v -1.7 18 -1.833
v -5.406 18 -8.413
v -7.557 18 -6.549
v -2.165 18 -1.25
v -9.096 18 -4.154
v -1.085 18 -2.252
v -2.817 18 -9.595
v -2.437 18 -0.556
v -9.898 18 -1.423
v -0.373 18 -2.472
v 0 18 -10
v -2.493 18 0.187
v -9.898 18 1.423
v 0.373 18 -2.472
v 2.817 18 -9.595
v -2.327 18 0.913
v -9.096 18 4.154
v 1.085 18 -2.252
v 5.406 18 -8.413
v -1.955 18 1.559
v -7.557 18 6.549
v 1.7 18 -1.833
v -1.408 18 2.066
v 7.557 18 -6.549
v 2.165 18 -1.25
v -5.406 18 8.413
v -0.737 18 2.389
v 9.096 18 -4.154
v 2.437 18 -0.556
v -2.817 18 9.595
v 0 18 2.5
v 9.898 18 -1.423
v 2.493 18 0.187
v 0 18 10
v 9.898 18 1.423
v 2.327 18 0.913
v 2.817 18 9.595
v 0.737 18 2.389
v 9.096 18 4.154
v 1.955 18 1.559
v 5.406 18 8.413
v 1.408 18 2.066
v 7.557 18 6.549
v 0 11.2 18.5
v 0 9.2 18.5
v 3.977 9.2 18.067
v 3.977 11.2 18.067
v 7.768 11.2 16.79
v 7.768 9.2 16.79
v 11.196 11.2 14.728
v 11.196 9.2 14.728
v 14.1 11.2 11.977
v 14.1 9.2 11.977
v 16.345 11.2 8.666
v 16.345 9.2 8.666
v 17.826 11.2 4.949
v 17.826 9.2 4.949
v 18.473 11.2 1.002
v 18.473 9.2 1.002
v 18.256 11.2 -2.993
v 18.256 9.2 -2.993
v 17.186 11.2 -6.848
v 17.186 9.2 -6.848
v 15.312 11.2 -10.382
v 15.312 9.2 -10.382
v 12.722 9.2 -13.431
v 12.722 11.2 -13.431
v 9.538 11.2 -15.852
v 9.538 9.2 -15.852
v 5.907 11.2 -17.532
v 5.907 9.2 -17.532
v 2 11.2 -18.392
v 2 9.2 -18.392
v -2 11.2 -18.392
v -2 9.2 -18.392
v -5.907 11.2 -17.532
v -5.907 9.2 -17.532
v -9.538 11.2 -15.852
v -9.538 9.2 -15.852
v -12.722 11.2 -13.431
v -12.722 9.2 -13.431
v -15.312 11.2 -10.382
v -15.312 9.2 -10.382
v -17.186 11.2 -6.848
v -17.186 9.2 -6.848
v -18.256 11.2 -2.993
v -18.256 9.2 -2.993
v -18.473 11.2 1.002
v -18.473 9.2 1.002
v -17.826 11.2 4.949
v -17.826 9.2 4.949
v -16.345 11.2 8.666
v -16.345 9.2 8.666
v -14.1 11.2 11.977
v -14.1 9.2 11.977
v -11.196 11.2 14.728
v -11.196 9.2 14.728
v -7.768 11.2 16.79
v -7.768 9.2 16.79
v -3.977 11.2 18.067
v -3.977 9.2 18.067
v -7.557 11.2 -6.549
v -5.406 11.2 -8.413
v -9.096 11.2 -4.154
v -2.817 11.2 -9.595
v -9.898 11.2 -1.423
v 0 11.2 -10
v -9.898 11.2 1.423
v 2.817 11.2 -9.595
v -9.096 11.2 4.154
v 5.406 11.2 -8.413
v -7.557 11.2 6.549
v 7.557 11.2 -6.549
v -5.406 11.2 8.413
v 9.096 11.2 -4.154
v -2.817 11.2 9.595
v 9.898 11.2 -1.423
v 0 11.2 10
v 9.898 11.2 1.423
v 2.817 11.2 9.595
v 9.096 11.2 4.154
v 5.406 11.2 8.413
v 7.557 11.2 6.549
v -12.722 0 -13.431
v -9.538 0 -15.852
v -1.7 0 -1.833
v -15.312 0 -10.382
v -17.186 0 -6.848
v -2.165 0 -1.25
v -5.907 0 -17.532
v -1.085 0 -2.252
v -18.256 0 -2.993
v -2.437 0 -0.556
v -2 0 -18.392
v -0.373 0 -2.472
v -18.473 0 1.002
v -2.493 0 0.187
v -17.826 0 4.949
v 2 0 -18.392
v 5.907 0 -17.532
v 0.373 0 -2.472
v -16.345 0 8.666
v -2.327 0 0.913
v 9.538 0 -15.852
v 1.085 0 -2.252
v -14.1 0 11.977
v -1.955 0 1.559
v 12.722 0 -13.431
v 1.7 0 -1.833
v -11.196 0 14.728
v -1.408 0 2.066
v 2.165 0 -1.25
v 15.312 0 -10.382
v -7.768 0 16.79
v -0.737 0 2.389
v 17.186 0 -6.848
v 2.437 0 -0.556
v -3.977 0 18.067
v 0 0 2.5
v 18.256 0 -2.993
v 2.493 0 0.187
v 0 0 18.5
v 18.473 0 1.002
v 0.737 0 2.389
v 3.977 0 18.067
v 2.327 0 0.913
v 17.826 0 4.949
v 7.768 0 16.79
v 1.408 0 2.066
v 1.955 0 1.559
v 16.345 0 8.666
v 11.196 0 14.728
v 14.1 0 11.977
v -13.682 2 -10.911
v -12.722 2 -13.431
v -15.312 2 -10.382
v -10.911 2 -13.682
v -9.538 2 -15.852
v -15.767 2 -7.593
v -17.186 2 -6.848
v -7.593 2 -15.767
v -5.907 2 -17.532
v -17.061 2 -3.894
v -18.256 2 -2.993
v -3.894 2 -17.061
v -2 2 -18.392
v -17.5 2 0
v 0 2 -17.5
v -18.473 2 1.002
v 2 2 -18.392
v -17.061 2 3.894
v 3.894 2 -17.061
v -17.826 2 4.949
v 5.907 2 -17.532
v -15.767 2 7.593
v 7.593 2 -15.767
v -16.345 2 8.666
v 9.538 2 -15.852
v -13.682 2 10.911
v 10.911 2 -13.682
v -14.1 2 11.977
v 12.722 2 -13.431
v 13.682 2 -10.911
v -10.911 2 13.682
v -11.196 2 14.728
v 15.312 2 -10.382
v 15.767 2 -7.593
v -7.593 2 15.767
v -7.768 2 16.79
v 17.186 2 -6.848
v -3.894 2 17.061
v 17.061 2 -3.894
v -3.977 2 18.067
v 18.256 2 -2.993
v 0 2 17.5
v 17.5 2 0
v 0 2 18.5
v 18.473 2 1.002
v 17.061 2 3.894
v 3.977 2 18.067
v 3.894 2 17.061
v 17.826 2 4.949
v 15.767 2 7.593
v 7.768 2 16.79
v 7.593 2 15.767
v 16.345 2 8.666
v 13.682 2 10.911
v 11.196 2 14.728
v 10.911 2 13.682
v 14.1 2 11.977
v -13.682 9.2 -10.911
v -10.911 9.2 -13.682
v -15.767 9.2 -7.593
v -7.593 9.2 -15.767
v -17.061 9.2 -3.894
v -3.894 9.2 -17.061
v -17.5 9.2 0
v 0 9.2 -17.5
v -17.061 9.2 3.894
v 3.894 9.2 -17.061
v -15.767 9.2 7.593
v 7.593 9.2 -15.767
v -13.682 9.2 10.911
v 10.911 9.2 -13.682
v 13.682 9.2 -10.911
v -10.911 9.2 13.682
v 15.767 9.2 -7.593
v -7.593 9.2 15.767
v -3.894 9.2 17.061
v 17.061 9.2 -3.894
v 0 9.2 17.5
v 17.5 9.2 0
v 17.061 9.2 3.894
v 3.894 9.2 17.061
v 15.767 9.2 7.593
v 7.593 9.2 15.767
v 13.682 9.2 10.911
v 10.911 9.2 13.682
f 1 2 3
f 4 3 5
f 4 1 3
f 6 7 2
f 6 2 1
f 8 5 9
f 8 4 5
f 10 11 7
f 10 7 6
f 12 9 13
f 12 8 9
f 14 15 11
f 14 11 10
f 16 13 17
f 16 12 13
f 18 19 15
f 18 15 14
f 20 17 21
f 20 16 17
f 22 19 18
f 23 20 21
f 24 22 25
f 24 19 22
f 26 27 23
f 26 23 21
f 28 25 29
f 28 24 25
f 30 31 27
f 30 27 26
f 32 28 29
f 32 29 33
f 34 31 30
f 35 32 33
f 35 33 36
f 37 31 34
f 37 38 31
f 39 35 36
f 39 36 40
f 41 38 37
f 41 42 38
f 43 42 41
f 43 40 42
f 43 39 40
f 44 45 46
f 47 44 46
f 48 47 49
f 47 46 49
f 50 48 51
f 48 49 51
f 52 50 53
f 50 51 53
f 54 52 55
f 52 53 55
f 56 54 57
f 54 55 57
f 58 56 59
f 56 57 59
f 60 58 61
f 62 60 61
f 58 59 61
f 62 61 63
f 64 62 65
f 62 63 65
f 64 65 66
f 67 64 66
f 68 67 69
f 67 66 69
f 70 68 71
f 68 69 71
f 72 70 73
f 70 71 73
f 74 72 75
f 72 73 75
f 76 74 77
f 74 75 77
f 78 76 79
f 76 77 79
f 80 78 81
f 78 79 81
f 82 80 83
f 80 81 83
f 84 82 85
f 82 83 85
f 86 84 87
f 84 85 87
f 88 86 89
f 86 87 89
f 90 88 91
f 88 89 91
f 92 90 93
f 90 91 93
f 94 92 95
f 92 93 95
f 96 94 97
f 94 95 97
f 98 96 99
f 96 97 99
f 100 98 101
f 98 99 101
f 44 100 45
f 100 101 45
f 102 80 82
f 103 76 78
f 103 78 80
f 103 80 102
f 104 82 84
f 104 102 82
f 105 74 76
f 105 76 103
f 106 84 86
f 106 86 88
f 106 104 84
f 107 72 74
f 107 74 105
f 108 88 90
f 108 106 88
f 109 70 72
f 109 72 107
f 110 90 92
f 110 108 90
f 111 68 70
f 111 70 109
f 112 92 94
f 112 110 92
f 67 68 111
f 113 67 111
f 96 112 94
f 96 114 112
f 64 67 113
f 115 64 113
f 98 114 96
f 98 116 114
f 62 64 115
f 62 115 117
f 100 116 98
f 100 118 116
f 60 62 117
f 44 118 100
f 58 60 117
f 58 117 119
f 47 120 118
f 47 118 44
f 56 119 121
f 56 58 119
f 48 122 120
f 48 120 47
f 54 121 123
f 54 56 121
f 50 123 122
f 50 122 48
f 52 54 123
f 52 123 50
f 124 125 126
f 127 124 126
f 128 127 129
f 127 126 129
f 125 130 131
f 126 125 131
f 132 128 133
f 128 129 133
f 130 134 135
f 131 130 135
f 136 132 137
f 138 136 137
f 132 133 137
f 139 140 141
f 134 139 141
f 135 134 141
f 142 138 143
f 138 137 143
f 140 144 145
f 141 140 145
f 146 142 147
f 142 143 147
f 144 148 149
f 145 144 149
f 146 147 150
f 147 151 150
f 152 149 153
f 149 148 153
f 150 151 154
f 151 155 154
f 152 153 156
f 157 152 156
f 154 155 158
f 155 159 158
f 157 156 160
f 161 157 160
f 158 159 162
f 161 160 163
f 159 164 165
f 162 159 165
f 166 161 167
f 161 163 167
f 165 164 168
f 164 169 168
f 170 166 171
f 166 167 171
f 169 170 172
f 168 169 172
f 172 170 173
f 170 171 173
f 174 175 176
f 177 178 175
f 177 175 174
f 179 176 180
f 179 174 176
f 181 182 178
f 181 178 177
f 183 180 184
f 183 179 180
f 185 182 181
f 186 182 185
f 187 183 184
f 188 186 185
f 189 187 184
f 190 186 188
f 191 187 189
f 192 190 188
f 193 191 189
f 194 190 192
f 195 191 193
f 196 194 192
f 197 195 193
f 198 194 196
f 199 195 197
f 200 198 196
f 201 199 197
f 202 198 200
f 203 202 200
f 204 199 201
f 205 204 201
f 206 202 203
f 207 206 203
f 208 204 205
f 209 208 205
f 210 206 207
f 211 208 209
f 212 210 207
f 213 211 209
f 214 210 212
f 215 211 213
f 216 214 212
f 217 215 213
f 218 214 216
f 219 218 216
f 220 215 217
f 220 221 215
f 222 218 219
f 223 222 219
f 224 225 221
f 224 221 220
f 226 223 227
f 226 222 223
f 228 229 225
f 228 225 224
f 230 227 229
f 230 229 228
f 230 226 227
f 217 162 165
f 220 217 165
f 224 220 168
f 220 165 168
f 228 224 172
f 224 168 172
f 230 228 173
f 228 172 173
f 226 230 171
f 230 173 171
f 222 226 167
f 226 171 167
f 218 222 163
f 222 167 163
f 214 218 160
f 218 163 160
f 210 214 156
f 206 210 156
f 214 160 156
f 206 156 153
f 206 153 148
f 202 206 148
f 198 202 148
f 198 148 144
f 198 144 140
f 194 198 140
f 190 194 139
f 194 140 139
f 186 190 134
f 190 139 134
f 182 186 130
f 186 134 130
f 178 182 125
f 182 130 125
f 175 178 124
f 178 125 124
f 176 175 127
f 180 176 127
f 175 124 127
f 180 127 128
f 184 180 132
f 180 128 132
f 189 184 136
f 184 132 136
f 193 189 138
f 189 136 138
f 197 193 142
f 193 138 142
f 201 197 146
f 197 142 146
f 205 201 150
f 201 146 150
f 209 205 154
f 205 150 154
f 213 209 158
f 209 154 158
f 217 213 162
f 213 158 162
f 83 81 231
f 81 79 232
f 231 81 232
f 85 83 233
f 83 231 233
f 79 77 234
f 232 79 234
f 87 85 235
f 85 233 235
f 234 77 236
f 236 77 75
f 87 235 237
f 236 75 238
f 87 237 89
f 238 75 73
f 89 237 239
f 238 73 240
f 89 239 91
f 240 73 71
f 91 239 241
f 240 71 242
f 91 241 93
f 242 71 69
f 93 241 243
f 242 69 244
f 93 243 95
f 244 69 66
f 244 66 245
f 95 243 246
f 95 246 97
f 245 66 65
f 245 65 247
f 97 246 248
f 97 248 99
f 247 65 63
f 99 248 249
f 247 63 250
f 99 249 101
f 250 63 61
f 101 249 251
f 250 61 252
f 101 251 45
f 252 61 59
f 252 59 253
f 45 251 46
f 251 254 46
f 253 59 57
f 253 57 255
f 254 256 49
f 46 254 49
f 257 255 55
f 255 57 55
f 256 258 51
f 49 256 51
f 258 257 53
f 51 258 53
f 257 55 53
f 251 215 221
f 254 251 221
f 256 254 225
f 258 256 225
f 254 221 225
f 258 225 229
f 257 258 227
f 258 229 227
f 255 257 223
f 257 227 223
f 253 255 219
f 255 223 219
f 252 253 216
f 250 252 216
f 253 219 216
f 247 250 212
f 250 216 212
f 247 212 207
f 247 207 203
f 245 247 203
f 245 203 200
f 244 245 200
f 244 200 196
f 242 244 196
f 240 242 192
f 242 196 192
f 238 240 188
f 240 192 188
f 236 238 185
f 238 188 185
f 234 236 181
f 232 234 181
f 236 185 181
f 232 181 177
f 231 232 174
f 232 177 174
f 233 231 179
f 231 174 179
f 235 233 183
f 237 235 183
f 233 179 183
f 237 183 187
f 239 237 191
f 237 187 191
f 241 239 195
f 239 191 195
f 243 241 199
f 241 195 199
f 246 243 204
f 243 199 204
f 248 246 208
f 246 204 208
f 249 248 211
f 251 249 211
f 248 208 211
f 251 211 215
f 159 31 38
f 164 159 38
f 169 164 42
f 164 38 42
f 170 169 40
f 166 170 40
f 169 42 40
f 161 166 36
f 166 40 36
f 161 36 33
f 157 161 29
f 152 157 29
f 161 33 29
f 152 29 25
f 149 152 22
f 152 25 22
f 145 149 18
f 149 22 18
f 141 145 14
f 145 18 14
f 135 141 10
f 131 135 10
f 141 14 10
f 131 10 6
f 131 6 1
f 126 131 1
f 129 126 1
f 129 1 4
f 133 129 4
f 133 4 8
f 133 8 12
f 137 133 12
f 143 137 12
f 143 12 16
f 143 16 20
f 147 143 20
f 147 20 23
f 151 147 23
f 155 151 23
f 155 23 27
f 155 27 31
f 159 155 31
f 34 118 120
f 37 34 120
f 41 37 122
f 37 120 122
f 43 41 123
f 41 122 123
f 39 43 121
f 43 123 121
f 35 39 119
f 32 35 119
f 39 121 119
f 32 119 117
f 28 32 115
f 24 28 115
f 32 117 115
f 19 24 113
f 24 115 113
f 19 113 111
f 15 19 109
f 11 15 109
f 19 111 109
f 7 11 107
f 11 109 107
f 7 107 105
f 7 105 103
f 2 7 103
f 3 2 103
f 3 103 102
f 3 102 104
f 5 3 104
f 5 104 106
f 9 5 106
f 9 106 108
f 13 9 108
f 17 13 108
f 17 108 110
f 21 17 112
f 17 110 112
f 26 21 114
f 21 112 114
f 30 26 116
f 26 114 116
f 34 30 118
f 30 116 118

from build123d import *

# Parameters (mm, degrees)
SKIZZE1_R                       = 18.5
AUFSATZ_LINEAR_AUSTRAGEN1_DEPTH = 2
SKIZZE2_R                       = 17.5
AUFSATZ_LINEAR_AUSTRAGEN2_DEPTH = 7.2
SKIZZE3_R                       = 18.5
AUFSATZ_LINEAR_AUSTRAGEN3_DEPTH = 2
SKIZZE4_R                       = 10
AUFSATZ_LINEAR_AUSTRAGEN4_DEPTH = 6.8
SKIZZE5_R                       = 2.5
SCHNITT_LINEAR_AUSTRAGEN1_DEPTH = 32.756889016


with BuildPart() as part:
    # Skizze1 → Aufsatz-Linear austragen1 (new body)
    with BuildSketch(Plane(origin=(0, 0, 0), x_dir=(1, 0, 0), z_dir=(0, 1, 0))):
        with Locations(Location((0, 0, 0), (0, 0, 270))):
            Circle(SKIZZE1_R)
    extrude(amount=AUFSATZ_LINEAR_AUSTRAGEN1_DEPTH)

    # Skizze2 → Aufsatz-Linear austragen2 (add)
    with BuildSketch(Plane(origin=(0, 2, 0), x_dir=(1, 0, 0), z_dir=(0, 1, 0))):
        with Locations(Location((0, 0, 0), (0, 0, 270))):
            Circle(SKIZZE2_R)
    extrude(amount=AUFSATZ_LINEAR_AUSTRAGEN2_DEPTH)

    # Skizze3 → Aufsatz-Linear austragen3 (add)
    with BuildSketch(Plane(origin=(0, 9.2, 0), x_dir=(1, 0, 0), z_dir=(0, 1, 0))):
        with Locations(Location((0, 0, 0), (0, 0, 270))):
            Circle(SKIZZE3_R)
    extrude(amount=AUFSATZ_LINEAR_AUSTRAGEN3_DEPTH)

    # Skizze4 → Aufsatz-Linear austragen4 (add)
    with BuildSketch(Plane(origin=(0, 11.2, 0), x_dir=(1, 0, 0), z_dir=(0, 1, 0))):
        with Locations(Location((0, 0, 0), (0, 0, 270))):
            Circle(SKIZZE4_R)
    extrude(amount=AUFSATZ_LINEAR_AUSTRAGEN4_DEPTH)

    # Skizze5 → Schnitt-Linear austragen1 (cut, through all)
    with BuildSketch(Plane(origin=(0, 18, 0), x_dir=(1, 0, 0), z_dir=(0, 1, 0))):
        with Locations(Location((0, 0, 0), (0, 0, 270))):
            Circle(SKIZZE5_R)
    extrude(amount=-SCHNITT_LINEAR_AUSTRAGEN1_DEPTH, mode=Mode.SUBTRACT)


solid = part.part
